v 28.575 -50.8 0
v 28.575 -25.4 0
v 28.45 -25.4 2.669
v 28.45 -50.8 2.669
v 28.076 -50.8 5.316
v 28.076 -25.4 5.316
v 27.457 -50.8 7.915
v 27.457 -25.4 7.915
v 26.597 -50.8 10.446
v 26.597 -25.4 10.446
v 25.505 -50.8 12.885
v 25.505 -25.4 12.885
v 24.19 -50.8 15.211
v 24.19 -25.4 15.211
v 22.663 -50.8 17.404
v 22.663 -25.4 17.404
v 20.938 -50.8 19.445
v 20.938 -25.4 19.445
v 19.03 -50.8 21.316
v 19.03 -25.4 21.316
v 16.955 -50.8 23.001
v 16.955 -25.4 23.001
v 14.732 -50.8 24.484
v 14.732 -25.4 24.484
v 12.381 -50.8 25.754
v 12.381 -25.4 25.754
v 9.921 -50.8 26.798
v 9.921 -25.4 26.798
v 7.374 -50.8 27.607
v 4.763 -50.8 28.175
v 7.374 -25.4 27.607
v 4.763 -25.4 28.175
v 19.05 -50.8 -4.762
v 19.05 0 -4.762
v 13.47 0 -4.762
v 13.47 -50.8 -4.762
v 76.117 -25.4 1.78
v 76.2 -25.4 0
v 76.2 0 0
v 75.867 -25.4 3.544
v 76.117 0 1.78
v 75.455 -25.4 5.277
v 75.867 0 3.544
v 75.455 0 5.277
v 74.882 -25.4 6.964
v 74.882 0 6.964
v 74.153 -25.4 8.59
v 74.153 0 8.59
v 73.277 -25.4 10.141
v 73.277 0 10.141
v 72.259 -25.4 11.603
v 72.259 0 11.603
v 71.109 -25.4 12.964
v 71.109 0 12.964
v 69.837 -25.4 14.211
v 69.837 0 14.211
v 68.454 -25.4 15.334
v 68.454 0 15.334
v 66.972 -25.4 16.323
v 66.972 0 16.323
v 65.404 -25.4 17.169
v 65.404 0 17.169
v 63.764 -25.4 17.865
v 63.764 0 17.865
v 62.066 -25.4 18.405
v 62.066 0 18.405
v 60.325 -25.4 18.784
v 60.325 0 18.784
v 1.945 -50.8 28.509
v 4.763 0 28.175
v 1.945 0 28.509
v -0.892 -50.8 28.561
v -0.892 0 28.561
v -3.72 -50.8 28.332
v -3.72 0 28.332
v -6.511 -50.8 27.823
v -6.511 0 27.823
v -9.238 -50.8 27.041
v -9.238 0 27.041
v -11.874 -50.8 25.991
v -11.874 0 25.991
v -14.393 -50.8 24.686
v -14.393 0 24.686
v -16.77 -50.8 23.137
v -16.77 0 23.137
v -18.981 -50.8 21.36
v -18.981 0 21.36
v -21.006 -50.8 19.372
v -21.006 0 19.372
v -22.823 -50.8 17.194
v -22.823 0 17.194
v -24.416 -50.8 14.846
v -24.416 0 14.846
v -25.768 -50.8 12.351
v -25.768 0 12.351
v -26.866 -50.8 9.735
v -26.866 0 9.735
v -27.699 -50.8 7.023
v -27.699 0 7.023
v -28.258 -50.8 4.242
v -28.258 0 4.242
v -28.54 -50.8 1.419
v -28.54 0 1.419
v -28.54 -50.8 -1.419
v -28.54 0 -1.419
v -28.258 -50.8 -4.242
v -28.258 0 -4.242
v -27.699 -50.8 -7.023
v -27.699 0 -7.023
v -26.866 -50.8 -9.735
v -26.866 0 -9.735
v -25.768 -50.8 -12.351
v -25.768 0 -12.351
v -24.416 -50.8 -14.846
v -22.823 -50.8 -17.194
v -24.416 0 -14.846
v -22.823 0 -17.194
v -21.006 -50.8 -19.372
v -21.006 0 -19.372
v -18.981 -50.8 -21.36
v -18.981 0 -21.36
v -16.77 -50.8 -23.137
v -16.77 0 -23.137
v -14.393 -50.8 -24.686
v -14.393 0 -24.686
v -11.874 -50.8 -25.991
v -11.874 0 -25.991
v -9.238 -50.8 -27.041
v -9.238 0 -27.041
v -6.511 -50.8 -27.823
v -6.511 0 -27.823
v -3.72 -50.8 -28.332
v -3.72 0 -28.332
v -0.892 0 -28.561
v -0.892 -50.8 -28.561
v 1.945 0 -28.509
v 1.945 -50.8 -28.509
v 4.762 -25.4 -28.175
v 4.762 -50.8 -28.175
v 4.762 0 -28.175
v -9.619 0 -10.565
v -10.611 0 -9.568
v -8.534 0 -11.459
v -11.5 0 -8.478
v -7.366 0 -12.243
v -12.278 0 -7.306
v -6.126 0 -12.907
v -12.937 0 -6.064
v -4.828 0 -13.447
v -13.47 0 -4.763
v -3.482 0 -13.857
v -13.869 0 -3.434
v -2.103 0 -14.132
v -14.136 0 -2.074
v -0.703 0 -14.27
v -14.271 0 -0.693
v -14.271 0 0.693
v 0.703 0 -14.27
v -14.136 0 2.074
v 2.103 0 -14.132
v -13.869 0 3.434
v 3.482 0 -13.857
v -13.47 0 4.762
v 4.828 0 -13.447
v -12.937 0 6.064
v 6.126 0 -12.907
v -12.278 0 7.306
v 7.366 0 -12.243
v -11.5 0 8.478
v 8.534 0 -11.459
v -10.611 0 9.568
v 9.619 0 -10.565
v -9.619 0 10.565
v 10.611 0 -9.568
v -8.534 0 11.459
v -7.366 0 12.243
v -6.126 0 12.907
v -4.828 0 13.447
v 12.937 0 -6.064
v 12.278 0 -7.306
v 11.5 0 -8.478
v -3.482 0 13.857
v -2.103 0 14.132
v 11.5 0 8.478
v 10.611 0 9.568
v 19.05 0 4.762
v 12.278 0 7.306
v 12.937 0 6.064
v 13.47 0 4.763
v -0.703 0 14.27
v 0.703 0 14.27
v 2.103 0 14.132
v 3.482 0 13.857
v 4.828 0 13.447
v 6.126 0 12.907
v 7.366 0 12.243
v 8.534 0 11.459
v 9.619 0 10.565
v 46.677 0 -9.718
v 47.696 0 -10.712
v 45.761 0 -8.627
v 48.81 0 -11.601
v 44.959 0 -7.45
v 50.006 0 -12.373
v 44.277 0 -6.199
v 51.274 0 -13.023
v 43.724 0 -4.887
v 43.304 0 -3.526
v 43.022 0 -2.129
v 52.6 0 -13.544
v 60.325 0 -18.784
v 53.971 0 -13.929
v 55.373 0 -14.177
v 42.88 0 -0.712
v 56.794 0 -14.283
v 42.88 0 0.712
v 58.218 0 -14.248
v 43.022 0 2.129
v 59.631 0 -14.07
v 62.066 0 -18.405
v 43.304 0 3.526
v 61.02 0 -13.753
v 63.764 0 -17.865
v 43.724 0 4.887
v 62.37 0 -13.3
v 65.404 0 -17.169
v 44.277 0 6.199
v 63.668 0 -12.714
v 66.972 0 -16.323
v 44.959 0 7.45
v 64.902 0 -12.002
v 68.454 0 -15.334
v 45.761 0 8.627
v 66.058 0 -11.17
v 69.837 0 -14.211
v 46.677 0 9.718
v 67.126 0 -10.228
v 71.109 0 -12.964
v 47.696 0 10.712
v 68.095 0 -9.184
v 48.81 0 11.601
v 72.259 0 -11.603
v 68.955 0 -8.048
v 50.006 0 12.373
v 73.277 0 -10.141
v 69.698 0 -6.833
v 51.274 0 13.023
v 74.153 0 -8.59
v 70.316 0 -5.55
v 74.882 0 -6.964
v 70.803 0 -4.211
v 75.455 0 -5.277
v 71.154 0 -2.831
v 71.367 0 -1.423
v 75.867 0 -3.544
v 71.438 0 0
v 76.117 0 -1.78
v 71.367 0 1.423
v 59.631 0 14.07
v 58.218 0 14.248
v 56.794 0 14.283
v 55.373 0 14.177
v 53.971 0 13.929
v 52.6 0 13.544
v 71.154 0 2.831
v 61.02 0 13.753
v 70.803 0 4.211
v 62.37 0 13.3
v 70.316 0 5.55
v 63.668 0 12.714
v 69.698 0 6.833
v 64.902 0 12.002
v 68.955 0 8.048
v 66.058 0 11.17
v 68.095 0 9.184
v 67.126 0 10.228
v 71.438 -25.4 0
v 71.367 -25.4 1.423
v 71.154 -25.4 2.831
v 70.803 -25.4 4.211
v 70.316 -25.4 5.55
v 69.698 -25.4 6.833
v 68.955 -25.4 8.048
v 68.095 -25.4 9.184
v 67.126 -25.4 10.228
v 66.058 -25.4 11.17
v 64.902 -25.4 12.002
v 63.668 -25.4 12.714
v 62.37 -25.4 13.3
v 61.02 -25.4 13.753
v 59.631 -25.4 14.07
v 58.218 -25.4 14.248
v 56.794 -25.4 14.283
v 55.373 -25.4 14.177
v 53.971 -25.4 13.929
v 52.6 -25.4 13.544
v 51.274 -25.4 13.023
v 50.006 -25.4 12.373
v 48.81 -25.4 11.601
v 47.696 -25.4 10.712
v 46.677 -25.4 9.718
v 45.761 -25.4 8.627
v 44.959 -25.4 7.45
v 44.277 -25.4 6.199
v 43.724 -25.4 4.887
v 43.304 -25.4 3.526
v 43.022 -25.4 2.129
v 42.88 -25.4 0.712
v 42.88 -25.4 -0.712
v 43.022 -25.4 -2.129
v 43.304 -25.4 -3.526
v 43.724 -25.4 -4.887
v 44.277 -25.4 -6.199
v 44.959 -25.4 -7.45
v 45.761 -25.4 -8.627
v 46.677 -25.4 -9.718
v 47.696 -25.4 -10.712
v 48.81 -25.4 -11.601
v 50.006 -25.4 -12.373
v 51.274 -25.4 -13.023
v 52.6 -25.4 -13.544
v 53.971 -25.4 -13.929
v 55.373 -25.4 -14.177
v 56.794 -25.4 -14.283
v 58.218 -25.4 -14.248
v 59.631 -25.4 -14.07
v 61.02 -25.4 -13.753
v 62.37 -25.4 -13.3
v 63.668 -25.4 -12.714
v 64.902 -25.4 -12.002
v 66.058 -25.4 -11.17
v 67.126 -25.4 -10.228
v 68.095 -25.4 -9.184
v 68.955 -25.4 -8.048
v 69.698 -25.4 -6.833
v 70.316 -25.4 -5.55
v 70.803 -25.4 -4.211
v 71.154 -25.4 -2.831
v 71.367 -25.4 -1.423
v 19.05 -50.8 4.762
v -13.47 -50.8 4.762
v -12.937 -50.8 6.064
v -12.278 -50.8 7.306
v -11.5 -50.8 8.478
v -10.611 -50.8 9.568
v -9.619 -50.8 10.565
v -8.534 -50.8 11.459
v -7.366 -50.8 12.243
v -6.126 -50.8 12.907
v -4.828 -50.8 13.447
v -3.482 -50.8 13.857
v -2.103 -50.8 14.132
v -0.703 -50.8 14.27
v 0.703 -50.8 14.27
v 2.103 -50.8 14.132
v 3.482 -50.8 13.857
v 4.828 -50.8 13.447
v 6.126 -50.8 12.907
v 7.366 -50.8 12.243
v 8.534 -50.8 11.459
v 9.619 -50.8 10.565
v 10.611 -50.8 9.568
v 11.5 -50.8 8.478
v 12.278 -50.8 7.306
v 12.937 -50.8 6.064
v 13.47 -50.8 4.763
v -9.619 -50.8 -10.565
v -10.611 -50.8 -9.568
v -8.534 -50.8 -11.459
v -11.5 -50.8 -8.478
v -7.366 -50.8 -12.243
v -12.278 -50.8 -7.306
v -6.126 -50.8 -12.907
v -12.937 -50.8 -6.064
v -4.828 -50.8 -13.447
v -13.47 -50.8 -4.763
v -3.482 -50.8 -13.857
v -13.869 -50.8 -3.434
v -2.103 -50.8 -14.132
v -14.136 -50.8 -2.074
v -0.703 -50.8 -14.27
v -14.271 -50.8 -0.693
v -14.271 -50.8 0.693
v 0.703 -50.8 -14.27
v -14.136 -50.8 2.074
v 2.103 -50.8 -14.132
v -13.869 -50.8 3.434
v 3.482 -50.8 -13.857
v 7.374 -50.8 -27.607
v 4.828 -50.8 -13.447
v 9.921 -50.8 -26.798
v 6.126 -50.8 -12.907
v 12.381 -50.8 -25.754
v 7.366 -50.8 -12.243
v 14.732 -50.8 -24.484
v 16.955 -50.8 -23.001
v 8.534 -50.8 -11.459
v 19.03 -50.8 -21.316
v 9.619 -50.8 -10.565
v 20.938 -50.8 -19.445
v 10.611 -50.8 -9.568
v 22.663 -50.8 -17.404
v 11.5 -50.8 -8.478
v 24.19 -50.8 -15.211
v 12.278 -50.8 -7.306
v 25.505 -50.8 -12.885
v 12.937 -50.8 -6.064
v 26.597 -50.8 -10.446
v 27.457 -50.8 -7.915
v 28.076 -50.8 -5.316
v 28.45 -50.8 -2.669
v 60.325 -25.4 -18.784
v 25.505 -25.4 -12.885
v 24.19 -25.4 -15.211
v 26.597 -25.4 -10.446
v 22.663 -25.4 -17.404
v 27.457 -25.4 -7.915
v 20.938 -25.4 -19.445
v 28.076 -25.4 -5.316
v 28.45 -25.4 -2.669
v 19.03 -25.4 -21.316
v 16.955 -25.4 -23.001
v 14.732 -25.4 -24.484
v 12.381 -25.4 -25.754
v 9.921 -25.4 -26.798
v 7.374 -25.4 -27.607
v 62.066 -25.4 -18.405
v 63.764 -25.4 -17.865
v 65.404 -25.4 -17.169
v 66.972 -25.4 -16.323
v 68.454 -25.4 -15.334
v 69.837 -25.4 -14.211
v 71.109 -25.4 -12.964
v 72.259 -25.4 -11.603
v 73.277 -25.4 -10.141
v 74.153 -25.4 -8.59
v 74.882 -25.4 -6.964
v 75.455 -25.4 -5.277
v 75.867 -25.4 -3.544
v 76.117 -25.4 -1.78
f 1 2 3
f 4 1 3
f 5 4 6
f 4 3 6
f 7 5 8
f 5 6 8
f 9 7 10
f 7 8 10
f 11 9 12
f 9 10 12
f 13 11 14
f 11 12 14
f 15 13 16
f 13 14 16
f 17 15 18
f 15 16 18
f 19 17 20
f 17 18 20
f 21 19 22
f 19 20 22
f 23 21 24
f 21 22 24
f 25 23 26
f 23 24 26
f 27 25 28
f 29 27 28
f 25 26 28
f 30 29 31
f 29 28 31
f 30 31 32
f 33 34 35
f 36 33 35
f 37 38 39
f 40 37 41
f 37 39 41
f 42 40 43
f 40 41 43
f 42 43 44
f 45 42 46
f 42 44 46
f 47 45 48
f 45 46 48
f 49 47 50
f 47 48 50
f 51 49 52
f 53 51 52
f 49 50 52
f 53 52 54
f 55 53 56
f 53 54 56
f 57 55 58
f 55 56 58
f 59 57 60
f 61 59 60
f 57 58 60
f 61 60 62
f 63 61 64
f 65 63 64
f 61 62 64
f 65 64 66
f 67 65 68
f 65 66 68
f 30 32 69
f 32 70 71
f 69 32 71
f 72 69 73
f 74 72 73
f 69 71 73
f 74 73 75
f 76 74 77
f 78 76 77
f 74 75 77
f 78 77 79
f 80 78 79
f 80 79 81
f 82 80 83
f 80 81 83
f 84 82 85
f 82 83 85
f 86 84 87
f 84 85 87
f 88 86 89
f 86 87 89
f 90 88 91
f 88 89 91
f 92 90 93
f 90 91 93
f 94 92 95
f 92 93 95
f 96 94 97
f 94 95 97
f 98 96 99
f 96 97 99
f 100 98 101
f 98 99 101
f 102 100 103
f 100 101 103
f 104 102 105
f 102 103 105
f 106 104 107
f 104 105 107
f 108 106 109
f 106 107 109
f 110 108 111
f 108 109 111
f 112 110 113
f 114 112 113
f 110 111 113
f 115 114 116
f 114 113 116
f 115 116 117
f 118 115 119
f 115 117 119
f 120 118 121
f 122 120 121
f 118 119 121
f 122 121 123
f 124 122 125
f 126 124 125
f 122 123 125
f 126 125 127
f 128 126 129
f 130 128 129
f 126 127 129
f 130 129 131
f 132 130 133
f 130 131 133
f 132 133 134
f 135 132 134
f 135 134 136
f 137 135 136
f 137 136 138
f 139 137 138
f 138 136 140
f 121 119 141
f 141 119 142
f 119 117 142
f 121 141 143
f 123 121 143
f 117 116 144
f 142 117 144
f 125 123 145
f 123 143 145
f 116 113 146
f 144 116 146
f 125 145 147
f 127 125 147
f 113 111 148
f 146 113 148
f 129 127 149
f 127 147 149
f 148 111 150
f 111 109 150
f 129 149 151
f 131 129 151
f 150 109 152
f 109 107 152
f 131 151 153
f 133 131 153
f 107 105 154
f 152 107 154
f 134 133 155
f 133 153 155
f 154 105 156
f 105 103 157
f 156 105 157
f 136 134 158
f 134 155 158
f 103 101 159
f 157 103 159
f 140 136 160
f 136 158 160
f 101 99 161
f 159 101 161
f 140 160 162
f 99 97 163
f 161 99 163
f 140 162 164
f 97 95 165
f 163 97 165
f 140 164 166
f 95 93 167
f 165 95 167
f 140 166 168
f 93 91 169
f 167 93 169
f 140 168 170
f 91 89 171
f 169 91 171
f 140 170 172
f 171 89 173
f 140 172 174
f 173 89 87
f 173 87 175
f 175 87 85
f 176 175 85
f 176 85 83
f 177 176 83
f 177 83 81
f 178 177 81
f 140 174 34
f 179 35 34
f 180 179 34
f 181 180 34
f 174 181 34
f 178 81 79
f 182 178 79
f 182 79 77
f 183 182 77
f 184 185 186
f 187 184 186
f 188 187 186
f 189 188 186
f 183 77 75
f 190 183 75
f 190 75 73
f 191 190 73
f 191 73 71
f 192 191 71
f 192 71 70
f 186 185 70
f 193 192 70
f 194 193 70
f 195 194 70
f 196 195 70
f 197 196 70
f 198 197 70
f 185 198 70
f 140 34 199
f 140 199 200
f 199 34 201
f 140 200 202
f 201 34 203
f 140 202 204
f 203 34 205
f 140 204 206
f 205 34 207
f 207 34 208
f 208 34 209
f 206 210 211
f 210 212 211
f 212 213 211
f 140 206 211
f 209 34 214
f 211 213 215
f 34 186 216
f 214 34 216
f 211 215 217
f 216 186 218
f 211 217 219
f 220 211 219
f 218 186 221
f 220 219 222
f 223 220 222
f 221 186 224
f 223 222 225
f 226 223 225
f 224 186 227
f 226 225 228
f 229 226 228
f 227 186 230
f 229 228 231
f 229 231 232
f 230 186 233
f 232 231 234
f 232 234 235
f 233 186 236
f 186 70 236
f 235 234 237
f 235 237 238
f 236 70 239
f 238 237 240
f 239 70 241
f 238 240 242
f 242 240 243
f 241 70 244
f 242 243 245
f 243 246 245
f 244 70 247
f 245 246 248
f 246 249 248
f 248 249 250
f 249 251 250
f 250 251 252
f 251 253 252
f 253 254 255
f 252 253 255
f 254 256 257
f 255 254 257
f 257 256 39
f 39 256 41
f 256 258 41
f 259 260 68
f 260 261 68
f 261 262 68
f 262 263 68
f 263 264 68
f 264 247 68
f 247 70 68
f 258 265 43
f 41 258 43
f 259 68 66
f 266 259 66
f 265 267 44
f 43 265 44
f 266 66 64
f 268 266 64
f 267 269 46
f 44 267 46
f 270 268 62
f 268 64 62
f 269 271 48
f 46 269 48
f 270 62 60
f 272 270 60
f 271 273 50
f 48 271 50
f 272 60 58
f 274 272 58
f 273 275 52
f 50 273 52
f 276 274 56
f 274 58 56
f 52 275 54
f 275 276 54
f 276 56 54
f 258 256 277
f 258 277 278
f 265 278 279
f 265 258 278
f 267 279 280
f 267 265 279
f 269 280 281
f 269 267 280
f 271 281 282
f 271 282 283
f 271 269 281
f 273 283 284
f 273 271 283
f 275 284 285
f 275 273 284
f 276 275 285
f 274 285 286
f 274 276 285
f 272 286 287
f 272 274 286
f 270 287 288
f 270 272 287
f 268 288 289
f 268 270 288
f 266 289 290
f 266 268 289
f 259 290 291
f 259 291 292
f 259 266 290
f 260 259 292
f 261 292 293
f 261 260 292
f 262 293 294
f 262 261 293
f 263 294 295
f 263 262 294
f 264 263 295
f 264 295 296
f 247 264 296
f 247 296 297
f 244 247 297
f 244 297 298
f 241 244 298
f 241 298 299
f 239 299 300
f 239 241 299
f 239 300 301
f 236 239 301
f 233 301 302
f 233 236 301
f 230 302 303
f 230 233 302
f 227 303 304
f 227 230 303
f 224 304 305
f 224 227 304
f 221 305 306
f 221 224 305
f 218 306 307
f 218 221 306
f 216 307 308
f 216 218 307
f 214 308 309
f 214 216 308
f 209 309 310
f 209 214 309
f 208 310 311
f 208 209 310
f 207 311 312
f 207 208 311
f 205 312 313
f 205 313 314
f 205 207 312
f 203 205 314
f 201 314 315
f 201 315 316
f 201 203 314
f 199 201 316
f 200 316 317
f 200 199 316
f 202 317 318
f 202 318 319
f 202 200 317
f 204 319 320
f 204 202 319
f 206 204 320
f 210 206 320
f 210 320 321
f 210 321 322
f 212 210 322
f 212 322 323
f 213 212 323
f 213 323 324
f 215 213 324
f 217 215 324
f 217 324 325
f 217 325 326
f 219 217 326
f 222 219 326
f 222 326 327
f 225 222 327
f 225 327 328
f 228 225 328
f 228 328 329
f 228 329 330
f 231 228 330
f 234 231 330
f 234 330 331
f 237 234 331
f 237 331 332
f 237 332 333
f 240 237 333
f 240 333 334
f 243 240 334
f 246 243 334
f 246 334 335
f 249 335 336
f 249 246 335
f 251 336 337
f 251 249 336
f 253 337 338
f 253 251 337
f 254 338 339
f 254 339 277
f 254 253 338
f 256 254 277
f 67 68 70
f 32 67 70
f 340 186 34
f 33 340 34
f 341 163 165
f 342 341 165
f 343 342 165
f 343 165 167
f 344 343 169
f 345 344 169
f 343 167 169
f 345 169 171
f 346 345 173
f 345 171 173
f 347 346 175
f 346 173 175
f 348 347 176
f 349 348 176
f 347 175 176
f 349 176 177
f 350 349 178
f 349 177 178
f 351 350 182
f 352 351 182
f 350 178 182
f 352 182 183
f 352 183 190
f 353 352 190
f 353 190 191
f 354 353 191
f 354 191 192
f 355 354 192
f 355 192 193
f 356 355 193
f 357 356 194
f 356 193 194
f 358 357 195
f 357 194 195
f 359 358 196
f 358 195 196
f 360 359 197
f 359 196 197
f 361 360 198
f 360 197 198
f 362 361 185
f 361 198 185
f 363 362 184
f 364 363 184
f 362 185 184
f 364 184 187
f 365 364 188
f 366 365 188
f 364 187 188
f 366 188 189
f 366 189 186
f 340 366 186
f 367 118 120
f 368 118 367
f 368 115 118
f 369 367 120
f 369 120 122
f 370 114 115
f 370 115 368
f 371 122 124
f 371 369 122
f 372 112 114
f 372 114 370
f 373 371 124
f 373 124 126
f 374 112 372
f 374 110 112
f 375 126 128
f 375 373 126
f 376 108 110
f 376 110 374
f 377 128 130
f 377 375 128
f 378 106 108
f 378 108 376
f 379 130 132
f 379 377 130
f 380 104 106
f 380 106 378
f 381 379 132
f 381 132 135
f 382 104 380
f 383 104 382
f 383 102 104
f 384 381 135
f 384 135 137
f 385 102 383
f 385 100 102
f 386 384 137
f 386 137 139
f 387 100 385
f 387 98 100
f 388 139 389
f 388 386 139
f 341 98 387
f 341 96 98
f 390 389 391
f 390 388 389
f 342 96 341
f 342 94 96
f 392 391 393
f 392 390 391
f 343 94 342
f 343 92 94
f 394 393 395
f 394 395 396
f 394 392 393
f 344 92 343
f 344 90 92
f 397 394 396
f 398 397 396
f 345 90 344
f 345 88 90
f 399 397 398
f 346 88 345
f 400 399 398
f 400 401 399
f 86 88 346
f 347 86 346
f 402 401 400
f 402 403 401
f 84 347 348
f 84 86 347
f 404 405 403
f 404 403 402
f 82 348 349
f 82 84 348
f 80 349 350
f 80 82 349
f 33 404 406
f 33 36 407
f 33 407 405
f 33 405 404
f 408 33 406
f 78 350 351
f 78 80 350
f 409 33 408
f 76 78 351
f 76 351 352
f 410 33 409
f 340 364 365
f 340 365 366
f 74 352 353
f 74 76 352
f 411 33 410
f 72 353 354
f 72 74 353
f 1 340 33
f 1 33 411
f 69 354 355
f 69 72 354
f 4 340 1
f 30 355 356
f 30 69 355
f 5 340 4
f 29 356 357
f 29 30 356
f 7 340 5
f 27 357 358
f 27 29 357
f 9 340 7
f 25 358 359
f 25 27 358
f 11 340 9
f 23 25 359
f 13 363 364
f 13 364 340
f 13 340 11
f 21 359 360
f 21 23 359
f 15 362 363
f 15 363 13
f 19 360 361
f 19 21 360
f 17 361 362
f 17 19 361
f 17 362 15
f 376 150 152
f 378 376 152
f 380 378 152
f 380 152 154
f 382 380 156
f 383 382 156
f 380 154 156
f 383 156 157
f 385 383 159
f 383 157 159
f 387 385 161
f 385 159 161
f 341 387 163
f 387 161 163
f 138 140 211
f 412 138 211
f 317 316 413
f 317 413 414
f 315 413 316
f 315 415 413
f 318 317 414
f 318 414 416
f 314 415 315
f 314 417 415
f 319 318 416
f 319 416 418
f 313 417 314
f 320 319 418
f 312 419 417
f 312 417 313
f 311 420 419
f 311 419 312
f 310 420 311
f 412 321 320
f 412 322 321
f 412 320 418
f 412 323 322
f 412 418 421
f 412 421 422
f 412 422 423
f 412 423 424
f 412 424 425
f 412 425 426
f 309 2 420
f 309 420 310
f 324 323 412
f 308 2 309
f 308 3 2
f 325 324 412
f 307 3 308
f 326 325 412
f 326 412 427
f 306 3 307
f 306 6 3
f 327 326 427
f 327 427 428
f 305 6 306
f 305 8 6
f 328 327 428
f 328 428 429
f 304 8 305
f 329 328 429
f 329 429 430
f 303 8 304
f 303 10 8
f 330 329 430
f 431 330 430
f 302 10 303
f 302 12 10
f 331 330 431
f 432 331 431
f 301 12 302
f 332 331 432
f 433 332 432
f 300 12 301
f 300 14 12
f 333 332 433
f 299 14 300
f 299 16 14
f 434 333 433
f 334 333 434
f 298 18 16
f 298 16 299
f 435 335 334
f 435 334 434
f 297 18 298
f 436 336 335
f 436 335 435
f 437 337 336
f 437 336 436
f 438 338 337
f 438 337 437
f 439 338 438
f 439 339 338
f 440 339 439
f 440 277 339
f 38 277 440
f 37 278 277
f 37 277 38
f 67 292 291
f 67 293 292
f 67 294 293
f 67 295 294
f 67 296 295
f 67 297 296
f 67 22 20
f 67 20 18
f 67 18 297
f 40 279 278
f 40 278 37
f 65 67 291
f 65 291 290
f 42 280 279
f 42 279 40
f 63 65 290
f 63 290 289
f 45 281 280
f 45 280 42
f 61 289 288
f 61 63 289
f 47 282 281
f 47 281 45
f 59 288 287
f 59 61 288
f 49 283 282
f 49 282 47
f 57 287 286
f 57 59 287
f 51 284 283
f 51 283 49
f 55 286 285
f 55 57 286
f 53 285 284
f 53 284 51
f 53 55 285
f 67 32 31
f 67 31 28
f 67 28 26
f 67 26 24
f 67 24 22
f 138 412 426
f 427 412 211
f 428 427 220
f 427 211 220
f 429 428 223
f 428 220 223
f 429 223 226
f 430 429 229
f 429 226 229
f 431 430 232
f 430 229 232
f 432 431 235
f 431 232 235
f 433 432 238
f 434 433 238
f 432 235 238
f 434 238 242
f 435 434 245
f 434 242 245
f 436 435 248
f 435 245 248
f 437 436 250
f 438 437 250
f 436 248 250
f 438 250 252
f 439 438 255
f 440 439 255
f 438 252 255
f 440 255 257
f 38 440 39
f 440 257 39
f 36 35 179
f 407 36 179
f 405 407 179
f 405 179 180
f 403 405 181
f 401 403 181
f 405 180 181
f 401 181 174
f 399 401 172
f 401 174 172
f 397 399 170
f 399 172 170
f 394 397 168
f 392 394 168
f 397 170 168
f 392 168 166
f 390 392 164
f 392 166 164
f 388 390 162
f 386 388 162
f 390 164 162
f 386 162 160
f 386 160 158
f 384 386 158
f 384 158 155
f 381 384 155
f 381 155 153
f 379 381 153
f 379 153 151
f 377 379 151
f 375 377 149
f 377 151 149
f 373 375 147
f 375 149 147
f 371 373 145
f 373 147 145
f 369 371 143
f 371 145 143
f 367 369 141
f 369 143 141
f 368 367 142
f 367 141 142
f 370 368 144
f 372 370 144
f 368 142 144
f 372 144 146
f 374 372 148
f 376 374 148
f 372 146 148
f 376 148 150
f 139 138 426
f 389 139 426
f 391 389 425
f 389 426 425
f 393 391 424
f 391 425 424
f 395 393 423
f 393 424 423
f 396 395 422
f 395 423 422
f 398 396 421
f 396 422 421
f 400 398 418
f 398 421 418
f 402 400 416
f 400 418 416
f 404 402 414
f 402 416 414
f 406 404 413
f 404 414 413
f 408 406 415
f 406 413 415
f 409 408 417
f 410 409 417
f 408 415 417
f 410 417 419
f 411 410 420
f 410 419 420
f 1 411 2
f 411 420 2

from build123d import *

# Parameters (mm, degrees)
F0_R     = 14.2875
F1_DEPTH = 25.4
F2_DEPTH = 50.8


with BuildPart() as f1:
    # F0 (on Front) → F1 (new body)
    with BuildSketch(Plane.XZ):
        with BuildLine():
            ThreePointArc((4.7625, -28.17533), (21.824517, -18.445083), (28.575, 0))
            ThreePointArc((28.575, 0), (21.824517, 18.445083), (4.7625, 28.17533))
            ThreePointArc((4.7625, 28.17533), (-28.575, 0), (4.7625, -28.17533))
        make_face()
        with BuildLine():
            ThreePointArc((-13.470384, 4.7625), (0, 14.2875), (13.470384, 4.7625))
            Line((13.470384, 4.7625), (19.05, 4.7625))
            Line((19.05, 4.7625), (19.05, -4.7625))
            Line((19.05, -4.7625), (13.470384, -4.7625))
            ThreePointArc((13.470384, -4.7625), (0, -14.2875), (-13.470384, -4.7625))
            Line((-13.470384, -4.7625), (-19.05, -4.7625))
            Line((-19.05, -4.7625), (-19.05, 4.7625))
            Line((-19.05, 4.7625), (-13.470384, 4.7625))
        make_face(mode=Mode.SUBTRACT)
        with BuildLine():
            ThreePointArc((4.7625, 28.17533), (21.824517, 18.445083), (28.575, 0))
            ThreePointArc((28.575, 0), (21.824517, -18.445083), (4.7625, -28.17533))
            Line((4.7625, -28.17533), (60.325, -18.783553))
            ThreePointArc((60.325, -18.783553), (38.1, 0), (60.325, 18.783553))
            Line((60.325, 18.783553), (4.7625, 28.17533))
        make_face()
        with BuildLine():
            ThreePointArc((76.2, 0), (71.699678, 12.296722), (60.325, 18.783553))
            ThreePointArc((60.325, 18.783553), (38.1, 0), (60.325, -18.783553))
            ThreePointArc((60.325, -18.783553), (71.699678, -12.296722), (76.2, 0))
        make_face()
        with Locations((57.15, 0)):
            Circle(F0_R, mode=Mode.SUBTRACT)
        with BuildLine():
            ThreePointArc((-13.470384, -4.7625), (-14.2875, 0), (-13.470384, 4.7625))
            Line((-13.470384, 4.7625), (-19.05, 4.7625))
            Line((-19.05, 4.7625), (-19.05, -4.7625))
            Line((-19.05, -4.7625), (-13.470384, -4.7625))
        make_face()
    extrude(amount=F1_DEPTH)

    # F0 (on Front) → F2 (join)
    with BuildSketch(Plane.XZ):
        with BuildLine():
            ThreePointArc((4.7625, -28.17533), (21.824517, -18.445083), (28.575, 0))
            ThreePointArc((28.575, 0), (21.824517, 18.445083), (4.7625, 28.17533))
            ThreePointArc((4.7625, 28.17533), (-28.575, 0), (4.7625, -28.17533))
        make_face()
        with BuildLine():
            ThreePointArc((-13.470384, 4.7625), (0, 14.2875), (13.470384, 4.7625))
            Line((13.470384, 4.7625), (19.05, 4.7625))
            Line((19.05, 4.7625), (19.05, -4.7625))
            Line((19.05, -4.7625), (13.470384, -4.7625))
            ThreePointArc((13.470384, -4.7625), (0, -14.2875), (-13.470384, -4.7625))
            Line((-13.470384, -4.7625), (-19.05, -4.7625))
            Line((-19.05, -4.7625), (-19.05, 4.7625))
            Line((-19.05, 4.7625), (-13.470384, 4.7625))
        make_face(mode=Mode.SUBTRACT)
        with BuildLine():
            ThreePointArc((-13.470384, -4.7625), (-14.2875, 0), (-13.470384, 4.7625))
            Line((-13.470384, 4.7625), (-19.05, 4.7625))
            Line((-19.05, 4.7625), (-19.05, -4.7625))
            Line((-19.05, -4.7625), (-13.470384, -4.7625))
        make_face()
    extrude(amount=F2_DEPTH)


solid = f1.part
